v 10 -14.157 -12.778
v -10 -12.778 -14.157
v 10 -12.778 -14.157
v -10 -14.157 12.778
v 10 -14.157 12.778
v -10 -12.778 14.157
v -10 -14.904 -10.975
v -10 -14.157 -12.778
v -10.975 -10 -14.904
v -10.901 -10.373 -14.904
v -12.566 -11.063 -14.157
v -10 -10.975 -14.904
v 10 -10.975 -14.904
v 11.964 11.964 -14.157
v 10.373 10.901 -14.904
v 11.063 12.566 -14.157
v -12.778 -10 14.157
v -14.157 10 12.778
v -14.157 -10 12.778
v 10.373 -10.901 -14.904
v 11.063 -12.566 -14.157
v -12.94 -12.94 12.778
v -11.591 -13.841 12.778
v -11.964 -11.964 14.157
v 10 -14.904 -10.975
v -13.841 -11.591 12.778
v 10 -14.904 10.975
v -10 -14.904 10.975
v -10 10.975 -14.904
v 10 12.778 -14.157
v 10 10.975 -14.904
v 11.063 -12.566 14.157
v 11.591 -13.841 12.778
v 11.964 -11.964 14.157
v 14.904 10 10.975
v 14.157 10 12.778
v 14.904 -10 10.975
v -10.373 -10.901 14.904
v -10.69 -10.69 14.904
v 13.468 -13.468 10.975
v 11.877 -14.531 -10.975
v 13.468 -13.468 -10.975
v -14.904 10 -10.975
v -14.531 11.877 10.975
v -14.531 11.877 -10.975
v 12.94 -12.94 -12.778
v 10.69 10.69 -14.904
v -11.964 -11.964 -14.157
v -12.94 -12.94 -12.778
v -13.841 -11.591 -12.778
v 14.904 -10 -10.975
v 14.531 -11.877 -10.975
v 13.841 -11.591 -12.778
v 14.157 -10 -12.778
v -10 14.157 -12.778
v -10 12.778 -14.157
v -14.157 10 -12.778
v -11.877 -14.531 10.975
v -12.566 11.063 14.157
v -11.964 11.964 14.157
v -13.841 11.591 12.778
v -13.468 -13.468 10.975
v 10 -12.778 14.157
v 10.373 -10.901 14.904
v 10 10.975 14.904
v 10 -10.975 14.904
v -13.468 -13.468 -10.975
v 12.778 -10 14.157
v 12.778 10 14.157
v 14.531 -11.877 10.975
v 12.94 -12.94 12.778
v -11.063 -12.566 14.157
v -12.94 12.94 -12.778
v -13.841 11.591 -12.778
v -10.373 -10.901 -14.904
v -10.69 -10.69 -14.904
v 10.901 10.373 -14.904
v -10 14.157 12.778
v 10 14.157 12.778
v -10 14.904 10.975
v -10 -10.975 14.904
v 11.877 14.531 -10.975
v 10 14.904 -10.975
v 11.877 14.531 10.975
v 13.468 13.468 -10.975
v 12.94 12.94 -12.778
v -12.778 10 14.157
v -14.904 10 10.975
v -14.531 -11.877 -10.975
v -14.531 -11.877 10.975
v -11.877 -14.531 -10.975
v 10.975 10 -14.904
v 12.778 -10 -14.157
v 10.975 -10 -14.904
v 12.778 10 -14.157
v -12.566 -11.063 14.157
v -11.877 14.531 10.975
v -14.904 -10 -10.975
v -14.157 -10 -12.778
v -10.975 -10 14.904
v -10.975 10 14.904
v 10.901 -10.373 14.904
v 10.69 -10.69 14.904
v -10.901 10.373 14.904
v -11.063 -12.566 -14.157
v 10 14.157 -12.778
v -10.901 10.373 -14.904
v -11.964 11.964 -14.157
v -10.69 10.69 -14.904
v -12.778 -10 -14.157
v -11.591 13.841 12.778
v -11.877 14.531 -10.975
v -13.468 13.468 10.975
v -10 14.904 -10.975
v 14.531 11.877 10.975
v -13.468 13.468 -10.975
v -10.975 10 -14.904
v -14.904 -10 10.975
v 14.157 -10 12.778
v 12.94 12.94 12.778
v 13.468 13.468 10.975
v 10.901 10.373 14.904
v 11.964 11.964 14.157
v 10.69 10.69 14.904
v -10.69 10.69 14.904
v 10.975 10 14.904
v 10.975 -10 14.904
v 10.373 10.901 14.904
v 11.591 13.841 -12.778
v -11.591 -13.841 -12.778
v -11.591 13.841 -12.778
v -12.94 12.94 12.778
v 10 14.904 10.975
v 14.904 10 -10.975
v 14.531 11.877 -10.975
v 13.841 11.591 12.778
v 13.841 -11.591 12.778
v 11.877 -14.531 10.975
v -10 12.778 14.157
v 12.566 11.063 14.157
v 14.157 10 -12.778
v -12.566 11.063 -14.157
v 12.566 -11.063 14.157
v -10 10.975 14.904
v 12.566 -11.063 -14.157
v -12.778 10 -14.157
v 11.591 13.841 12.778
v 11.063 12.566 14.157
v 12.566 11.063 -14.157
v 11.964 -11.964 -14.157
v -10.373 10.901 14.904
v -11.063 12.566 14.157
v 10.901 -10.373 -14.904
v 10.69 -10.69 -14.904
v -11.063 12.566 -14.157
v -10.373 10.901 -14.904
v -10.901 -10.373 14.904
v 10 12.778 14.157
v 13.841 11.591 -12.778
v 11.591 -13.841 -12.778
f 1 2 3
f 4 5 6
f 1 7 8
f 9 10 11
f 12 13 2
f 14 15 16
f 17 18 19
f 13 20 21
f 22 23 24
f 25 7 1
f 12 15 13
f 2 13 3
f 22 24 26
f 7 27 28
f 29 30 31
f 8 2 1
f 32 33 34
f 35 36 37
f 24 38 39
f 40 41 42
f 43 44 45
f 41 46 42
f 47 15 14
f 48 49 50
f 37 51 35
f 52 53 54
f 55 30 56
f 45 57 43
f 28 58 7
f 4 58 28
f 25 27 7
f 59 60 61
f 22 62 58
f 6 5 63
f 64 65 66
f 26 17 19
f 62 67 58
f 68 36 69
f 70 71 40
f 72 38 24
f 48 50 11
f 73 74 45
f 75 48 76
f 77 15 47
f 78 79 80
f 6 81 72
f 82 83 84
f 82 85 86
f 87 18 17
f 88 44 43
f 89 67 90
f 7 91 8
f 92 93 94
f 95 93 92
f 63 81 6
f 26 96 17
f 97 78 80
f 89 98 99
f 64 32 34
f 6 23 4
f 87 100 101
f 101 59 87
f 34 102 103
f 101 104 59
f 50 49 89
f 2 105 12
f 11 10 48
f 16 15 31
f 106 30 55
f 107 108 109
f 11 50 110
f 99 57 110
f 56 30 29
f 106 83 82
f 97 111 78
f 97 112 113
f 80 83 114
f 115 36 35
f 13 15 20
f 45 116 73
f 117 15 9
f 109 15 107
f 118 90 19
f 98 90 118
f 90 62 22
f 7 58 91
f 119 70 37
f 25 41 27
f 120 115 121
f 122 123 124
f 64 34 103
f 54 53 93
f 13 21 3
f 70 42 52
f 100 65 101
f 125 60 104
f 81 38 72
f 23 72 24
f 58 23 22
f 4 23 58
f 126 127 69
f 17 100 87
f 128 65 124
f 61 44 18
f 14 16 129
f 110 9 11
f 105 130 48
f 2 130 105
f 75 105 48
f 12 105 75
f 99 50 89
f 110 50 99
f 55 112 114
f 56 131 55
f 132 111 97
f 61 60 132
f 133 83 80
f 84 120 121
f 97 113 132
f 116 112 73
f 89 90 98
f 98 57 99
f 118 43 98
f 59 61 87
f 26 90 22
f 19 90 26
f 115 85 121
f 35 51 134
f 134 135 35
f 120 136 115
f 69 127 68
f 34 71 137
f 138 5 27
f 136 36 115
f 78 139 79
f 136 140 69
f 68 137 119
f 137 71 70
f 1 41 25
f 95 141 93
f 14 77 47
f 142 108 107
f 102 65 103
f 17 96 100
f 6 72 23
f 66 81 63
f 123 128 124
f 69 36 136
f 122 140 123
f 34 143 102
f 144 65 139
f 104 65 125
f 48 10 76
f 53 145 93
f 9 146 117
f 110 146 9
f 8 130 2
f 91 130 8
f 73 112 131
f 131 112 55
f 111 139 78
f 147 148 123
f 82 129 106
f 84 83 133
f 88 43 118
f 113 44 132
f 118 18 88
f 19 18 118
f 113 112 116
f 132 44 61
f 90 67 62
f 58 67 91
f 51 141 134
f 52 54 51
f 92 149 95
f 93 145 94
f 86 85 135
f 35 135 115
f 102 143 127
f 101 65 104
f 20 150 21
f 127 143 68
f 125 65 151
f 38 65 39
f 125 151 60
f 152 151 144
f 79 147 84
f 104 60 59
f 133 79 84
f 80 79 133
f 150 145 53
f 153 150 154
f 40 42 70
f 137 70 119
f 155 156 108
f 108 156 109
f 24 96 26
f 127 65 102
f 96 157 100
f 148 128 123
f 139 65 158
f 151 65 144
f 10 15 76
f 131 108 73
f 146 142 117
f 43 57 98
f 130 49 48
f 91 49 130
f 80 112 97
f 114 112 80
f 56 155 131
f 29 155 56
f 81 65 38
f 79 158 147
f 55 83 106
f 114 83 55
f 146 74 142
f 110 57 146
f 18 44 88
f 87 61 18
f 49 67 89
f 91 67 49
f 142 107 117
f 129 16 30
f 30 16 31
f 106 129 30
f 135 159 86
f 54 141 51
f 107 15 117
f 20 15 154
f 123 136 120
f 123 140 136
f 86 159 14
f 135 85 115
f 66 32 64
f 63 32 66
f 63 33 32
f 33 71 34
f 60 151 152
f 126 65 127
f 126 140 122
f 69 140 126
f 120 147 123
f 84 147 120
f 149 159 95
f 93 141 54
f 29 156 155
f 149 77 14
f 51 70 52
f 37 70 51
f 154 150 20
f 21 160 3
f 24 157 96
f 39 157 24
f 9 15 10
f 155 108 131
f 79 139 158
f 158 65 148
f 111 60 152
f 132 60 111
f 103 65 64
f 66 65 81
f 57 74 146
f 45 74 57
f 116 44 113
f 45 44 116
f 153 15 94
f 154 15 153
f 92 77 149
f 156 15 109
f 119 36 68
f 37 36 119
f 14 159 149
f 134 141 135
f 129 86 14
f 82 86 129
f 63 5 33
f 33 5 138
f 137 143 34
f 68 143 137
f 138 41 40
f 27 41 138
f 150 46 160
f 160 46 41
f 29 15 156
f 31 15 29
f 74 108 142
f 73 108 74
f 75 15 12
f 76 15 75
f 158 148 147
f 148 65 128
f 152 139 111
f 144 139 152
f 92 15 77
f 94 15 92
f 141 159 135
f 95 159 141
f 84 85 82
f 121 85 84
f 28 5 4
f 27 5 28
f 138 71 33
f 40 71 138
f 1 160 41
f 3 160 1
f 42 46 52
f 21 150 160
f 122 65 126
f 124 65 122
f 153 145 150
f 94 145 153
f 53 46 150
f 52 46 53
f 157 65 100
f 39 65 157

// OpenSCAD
a = 20;

detalhe = $preview ? 32 : 128;


// linear_extrude(2)
//   text("Text");


minkowski()
{
    cube([20, 20, 20], center=true);
    sphere(d=10);
}


// cylinder(d1=20, d2=5, h=30);

// arco();

module arco ()
{
    intersection()
    { 
        cylinder(d=100, h=15, $fn=detalhe);

        translate([0, 0, -0.001])
            cube([60, 60, a]);
    }
}
